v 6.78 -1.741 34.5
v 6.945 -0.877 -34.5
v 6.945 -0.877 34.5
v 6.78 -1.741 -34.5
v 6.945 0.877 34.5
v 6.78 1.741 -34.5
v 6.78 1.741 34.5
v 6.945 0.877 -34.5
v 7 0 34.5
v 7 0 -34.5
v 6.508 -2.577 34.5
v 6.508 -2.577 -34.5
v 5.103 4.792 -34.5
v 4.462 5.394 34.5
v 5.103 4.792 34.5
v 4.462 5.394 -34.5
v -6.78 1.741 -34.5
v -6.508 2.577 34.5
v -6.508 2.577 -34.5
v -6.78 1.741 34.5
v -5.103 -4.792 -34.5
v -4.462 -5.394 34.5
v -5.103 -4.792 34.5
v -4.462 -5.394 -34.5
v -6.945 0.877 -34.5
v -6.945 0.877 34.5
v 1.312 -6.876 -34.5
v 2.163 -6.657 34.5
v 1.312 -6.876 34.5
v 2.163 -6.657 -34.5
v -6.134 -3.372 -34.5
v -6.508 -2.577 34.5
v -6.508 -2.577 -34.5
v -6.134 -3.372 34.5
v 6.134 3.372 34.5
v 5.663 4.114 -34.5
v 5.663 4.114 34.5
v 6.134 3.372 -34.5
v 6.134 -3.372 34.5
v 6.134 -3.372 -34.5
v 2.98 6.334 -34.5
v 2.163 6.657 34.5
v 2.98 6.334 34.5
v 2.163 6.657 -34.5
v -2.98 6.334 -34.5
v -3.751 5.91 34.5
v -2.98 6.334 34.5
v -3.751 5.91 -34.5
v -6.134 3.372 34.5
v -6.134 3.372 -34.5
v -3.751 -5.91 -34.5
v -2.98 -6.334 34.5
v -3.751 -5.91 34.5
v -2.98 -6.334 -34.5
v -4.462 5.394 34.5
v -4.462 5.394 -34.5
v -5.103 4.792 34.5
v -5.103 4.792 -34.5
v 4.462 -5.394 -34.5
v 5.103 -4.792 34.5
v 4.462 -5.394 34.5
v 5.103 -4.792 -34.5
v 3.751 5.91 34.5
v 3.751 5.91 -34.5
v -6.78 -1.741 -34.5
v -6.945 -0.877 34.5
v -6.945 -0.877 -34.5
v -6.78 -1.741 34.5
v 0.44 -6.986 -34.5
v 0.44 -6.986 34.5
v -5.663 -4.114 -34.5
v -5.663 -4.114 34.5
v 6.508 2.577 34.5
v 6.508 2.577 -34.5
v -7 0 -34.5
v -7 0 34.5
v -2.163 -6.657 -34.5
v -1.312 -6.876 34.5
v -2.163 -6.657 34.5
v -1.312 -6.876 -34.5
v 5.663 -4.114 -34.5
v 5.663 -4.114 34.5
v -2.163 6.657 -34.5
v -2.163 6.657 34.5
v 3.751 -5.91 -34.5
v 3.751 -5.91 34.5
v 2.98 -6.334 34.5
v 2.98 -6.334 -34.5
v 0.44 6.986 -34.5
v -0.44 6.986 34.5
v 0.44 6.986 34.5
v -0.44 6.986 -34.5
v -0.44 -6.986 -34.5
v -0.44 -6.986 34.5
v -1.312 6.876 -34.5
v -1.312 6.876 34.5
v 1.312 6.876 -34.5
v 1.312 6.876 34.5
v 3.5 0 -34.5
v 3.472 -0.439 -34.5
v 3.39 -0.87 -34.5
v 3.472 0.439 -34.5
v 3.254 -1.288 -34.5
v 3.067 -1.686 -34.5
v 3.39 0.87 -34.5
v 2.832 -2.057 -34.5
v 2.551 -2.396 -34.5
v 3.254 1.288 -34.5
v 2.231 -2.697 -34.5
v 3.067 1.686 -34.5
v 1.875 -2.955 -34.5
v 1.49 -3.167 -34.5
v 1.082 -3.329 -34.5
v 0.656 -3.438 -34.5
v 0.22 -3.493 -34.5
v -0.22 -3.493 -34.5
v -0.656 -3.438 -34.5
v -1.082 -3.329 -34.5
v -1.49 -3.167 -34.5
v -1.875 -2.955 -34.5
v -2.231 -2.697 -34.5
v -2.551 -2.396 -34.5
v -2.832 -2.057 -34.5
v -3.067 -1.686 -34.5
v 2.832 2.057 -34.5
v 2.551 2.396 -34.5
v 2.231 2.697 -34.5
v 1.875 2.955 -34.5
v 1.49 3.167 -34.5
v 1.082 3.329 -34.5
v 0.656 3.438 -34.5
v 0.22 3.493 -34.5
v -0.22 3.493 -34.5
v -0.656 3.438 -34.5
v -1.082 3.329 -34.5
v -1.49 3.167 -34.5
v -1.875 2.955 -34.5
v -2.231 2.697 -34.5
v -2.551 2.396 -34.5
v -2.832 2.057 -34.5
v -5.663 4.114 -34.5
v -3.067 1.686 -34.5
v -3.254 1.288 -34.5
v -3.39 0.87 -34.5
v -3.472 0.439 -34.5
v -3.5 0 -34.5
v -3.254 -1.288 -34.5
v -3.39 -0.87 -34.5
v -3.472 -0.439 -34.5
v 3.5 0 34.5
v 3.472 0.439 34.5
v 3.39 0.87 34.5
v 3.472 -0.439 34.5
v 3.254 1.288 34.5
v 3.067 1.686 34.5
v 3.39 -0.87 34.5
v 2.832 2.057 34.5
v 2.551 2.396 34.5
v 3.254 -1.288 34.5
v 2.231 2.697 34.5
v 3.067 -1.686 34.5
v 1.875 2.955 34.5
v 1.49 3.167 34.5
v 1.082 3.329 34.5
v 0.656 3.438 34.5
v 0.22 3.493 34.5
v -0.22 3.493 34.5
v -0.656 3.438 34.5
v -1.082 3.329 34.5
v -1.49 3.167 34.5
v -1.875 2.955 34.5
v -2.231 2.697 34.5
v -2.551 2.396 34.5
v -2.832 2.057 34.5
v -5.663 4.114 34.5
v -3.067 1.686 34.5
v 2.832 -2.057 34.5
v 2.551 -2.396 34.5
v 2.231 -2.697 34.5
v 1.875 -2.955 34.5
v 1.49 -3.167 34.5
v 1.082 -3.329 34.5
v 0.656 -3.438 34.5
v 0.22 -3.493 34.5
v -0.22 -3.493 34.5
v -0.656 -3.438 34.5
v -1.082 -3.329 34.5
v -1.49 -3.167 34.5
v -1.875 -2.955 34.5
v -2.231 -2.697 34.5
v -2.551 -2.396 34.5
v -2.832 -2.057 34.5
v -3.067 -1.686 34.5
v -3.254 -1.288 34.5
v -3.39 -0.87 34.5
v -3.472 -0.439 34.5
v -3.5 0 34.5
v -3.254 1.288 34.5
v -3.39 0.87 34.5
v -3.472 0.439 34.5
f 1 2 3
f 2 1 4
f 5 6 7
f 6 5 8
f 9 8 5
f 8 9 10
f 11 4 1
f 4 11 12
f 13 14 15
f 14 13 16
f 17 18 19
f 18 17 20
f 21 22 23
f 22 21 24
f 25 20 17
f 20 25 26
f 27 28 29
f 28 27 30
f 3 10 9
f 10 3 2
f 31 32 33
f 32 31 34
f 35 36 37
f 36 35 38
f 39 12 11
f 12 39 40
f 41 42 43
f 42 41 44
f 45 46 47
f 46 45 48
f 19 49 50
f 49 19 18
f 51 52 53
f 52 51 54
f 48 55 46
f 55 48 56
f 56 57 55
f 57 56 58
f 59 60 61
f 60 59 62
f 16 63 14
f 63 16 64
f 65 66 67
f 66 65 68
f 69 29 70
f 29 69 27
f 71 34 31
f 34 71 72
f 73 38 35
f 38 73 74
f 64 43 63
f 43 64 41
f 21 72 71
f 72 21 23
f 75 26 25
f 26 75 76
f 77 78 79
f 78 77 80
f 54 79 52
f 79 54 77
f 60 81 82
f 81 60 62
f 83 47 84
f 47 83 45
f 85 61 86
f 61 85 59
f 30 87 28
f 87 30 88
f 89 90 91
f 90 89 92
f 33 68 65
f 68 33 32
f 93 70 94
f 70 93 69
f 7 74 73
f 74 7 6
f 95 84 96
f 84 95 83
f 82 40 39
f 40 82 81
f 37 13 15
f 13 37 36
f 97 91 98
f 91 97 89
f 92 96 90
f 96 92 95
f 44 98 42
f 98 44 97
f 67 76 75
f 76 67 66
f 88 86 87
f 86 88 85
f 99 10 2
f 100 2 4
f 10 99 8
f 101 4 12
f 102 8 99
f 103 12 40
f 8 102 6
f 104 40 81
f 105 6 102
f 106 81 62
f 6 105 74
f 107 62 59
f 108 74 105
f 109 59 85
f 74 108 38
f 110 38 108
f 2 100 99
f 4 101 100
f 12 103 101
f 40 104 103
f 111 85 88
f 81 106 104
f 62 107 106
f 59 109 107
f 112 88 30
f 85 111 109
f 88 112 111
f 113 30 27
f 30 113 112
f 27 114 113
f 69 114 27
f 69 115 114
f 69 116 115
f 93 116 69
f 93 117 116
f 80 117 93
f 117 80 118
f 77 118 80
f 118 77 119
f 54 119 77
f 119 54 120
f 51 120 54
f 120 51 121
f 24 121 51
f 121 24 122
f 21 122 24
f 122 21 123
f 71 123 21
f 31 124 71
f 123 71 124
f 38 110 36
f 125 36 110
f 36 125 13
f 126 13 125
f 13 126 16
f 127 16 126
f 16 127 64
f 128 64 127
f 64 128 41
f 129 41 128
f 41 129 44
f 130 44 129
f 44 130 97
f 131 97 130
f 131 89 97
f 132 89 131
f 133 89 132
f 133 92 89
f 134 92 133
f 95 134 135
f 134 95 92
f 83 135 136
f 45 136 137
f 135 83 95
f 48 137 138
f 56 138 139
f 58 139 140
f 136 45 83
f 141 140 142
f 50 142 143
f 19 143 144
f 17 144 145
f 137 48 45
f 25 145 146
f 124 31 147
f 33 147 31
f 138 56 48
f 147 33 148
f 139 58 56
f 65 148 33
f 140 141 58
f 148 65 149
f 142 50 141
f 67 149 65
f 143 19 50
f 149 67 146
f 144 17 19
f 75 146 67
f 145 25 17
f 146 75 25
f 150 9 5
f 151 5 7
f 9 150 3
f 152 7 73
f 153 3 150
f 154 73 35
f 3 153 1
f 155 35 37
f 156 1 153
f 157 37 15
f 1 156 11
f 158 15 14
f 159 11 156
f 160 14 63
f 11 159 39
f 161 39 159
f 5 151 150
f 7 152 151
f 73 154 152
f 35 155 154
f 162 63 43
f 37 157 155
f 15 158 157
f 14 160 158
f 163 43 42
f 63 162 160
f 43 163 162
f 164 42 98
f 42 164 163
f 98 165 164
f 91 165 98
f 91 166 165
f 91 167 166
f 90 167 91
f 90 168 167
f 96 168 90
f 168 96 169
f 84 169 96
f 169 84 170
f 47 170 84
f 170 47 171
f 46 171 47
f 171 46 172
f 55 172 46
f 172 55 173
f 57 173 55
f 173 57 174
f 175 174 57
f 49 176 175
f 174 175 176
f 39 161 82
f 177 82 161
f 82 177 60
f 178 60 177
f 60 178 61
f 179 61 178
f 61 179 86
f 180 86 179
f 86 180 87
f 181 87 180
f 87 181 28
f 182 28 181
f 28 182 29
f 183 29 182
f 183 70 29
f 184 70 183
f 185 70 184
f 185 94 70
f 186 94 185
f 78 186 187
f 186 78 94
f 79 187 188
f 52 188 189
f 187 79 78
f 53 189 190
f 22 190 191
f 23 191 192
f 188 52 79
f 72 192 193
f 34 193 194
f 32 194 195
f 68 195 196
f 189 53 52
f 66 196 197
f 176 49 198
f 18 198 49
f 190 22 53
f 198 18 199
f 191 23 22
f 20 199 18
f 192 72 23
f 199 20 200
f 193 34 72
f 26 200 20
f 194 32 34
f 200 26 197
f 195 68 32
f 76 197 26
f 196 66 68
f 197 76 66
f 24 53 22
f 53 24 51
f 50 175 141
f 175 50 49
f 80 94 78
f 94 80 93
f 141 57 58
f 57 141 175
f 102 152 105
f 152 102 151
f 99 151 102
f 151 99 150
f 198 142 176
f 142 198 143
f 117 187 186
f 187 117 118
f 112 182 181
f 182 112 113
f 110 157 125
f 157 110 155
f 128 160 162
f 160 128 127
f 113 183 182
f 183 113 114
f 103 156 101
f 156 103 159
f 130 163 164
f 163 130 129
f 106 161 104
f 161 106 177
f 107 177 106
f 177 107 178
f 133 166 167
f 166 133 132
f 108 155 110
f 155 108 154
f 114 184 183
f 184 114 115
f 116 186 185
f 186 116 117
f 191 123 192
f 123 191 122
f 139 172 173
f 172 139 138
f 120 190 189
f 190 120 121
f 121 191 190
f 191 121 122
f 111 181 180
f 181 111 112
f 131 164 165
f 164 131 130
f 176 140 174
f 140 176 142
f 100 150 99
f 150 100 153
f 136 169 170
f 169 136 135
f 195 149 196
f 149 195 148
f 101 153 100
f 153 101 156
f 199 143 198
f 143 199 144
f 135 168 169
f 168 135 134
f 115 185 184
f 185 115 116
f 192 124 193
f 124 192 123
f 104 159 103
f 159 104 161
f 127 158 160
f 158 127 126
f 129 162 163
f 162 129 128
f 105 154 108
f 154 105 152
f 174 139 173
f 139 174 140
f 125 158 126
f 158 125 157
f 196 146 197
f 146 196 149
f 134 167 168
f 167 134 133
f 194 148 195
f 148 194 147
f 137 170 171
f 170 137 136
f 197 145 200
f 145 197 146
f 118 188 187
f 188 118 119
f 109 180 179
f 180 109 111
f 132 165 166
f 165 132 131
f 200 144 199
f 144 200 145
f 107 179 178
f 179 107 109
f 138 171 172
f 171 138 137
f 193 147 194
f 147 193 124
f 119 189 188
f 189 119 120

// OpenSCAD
$fn = 50;


difference() {
	union() {
		translate(v = [0, 0, -34.5000000000]) {
			cylinder(h = 69, r = 7.0000000000);
		}
	}
	union() {
		translate(v = [0, 0, -100.0000000000]) {
			cylinder(h = 200, r = 3.5000000000);
		}
	}
}
